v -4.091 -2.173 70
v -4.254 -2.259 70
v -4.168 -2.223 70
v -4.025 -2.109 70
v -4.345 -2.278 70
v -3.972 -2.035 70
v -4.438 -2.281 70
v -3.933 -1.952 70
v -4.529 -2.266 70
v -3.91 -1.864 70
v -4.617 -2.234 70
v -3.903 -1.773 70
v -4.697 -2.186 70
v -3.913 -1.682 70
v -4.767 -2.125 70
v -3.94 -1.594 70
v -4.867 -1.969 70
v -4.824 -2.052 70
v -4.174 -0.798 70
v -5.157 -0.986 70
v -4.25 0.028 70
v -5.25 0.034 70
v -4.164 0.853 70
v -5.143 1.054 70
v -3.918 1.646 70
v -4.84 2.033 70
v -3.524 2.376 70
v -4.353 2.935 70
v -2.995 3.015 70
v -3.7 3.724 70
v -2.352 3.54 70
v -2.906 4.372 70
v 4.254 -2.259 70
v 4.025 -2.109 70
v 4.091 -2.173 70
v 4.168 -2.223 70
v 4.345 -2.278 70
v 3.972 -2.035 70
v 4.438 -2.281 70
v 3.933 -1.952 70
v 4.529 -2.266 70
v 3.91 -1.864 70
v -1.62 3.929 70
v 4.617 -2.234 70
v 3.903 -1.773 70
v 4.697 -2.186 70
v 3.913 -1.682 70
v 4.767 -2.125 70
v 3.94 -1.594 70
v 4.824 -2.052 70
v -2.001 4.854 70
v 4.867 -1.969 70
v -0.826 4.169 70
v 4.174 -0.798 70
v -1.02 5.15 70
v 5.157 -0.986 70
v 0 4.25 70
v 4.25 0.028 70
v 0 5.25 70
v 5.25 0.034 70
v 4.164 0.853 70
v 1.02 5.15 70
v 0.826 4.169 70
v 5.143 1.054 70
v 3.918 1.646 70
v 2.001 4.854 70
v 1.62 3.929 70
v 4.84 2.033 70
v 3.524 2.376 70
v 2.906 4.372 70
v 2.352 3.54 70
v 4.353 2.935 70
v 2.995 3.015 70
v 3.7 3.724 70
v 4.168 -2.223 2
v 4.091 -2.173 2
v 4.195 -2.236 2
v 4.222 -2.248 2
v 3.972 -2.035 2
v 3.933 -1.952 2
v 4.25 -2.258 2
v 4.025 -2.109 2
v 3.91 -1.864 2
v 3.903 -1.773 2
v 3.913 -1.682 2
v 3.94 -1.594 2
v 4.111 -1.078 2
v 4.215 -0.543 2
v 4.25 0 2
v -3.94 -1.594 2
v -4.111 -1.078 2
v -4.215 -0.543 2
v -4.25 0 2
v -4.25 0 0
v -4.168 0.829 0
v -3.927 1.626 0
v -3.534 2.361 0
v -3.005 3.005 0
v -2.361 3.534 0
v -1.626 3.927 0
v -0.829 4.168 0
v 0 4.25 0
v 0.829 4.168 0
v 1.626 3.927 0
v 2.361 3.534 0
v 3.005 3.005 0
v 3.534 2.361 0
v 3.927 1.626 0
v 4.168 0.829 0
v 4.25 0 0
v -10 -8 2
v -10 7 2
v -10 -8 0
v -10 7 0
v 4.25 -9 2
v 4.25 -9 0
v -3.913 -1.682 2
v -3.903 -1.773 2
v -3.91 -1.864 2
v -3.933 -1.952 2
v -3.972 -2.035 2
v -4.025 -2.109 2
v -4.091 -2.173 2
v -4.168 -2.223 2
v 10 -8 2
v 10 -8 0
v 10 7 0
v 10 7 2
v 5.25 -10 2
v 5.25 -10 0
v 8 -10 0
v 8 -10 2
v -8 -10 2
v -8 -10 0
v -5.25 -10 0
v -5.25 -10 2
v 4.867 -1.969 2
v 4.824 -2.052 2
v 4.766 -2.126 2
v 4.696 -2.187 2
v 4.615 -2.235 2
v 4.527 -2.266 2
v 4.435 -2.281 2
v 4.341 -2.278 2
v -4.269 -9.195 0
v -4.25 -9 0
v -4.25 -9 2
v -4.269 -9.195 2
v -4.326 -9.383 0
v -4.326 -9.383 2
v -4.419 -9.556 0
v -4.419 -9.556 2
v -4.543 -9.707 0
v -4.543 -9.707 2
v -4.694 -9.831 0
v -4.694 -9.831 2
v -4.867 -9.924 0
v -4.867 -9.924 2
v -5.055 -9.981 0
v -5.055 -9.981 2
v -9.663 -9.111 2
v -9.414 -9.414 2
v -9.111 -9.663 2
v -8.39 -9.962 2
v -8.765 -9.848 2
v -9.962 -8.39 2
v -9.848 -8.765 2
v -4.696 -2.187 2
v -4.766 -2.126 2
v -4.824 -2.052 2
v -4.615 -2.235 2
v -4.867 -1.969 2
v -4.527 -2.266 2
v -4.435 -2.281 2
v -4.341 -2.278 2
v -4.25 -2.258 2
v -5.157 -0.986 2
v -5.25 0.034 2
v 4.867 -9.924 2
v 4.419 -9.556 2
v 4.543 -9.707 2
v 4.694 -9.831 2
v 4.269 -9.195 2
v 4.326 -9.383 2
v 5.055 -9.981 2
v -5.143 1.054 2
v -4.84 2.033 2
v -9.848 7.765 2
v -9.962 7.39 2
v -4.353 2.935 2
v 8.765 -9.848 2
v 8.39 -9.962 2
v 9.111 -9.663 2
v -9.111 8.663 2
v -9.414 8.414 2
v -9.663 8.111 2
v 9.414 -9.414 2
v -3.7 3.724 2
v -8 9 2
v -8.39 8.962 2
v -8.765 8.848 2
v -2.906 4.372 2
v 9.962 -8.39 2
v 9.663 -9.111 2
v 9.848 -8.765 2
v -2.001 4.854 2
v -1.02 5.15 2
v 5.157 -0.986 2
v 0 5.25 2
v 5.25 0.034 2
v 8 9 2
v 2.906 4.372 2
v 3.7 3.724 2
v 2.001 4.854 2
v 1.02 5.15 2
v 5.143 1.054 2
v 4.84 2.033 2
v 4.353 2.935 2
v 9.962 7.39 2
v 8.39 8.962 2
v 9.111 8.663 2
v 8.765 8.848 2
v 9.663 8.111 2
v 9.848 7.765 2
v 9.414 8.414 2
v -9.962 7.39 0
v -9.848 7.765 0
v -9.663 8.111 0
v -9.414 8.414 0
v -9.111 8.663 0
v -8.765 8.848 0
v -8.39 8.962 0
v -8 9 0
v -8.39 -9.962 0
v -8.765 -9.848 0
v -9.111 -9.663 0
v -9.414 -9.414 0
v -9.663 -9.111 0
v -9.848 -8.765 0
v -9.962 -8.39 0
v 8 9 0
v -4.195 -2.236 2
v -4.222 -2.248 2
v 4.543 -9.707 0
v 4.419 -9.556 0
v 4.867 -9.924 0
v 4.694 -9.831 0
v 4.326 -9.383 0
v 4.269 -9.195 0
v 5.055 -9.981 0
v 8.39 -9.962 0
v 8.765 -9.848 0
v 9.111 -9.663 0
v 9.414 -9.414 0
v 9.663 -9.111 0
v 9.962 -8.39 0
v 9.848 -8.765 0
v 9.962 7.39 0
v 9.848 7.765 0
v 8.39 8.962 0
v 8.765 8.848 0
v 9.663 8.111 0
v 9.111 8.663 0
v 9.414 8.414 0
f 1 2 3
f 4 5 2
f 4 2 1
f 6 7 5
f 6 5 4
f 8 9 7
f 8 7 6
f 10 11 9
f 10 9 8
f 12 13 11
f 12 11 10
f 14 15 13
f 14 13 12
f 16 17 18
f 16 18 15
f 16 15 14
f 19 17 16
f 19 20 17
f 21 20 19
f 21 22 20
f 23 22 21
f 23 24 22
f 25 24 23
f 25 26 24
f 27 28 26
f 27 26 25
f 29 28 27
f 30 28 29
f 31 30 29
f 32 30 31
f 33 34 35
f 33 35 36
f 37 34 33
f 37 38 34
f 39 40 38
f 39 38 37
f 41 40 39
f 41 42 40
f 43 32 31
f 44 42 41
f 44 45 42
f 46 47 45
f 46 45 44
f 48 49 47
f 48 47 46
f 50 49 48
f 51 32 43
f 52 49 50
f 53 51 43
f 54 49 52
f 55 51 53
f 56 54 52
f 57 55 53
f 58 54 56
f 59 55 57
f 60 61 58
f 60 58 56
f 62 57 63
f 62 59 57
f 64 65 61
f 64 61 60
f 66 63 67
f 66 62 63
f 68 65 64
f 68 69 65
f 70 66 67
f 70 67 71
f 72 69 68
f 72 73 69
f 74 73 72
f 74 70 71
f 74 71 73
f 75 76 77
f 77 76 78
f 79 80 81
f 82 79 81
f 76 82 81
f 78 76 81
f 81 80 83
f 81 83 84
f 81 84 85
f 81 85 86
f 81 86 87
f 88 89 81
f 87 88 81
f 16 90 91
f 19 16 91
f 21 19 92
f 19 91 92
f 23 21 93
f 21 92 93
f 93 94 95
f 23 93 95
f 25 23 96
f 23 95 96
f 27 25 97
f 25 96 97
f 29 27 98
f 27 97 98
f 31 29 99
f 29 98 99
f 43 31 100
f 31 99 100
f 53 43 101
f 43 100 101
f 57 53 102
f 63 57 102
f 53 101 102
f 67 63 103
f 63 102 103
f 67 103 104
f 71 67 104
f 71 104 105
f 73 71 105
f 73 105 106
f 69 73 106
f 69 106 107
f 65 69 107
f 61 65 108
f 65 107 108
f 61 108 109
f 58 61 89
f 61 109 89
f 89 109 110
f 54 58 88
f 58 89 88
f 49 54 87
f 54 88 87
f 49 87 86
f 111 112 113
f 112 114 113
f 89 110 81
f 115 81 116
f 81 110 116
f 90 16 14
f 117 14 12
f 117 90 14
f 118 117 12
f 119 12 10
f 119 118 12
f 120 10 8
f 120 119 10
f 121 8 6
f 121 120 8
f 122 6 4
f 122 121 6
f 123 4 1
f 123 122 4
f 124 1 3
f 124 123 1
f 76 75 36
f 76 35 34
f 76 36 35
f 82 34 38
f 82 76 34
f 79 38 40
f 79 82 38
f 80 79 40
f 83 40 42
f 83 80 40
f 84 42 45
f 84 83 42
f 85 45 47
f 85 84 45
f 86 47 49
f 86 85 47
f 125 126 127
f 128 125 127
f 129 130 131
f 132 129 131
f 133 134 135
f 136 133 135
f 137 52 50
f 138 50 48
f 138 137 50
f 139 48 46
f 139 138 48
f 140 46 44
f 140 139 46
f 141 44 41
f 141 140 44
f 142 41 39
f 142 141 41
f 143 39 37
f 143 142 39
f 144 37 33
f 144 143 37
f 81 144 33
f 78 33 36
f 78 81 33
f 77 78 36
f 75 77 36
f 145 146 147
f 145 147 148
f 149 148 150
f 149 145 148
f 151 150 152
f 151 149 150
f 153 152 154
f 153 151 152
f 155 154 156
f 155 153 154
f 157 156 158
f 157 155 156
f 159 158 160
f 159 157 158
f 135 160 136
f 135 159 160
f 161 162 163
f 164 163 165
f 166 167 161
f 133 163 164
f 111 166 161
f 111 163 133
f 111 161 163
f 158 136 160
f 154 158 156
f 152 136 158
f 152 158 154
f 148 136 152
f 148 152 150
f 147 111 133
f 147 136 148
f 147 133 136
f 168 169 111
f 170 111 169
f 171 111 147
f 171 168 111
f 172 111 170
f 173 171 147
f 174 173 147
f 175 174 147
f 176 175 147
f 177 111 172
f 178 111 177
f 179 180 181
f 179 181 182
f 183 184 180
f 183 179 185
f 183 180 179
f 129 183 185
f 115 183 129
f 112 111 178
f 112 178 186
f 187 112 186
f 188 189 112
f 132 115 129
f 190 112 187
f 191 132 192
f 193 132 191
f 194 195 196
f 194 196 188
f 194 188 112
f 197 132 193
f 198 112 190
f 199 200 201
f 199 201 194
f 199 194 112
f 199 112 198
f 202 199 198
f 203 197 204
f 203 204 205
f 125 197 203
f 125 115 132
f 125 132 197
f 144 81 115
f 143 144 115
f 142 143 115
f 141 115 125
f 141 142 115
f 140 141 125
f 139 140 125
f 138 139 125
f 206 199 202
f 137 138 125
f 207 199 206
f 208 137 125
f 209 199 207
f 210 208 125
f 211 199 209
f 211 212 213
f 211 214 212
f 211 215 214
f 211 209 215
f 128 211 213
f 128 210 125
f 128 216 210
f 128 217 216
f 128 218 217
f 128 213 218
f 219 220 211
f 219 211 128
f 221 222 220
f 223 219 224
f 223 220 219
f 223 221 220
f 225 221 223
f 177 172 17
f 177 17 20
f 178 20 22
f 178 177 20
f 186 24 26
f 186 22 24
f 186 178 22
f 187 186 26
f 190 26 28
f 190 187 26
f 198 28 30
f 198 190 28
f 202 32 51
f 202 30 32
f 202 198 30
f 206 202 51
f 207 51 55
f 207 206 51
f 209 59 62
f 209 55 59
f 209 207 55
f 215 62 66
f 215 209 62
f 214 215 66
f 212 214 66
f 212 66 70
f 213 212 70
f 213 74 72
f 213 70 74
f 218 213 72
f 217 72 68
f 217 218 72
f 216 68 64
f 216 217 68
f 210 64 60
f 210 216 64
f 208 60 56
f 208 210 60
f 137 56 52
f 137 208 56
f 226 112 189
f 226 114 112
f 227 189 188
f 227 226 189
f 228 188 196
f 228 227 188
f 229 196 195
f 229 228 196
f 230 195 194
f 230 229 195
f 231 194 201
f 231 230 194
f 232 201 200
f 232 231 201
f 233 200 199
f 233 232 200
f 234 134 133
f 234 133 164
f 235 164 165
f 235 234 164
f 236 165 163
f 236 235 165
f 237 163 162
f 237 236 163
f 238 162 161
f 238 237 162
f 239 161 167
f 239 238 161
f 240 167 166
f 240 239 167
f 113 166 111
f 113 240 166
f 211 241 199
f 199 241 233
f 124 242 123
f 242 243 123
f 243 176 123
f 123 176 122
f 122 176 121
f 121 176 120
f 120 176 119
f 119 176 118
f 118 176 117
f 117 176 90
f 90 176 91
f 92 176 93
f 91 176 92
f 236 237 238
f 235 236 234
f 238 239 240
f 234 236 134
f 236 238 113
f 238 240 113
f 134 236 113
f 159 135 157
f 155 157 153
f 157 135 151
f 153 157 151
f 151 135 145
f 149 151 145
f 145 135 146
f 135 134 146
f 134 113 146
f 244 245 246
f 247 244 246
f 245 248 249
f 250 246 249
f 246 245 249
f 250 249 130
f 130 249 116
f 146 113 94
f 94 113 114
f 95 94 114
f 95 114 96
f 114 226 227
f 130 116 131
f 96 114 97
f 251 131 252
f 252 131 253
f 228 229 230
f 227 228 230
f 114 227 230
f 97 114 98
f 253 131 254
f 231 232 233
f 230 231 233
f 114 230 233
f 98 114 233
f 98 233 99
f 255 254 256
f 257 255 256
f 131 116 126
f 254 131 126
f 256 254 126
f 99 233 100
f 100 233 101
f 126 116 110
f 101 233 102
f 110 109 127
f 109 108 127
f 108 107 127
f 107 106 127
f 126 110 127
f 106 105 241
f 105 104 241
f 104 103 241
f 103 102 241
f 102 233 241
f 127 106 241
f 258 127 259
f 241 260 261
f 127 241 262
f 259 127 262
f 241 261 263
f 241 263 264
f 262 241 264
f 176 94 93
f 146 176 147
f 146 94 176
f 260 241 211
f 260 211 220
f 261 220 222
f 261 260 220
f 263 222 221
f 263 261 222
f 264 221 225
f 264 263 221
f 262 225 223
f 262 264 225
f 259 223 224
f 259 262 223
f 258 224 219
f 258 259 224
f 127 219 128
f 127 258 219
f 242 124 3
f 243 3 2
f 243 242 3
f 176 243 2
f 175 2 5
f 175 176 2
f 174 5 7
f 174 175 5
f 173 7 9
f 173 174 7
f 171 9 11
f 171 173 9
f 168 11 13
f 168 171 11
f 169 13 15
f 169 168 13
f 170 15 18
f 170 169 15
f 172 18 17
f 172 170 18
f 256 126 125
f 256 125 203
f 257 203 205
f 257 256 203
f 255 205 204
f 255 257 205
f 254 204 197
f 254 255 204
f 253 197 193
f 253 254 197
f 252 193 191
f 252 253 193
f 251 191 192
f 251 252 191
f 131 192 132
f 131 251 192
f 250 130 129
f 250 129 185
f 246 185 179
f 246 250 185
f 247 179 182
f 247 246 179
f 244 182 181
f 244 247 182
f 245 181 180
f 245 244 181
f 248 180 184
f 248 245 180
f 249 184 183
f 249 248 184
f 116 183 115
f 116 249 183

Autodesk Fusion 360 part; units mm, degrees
sketch "Skizze1" plane through (0, 0, 0) normal (0, 0, 1) x (1, 0, 0)
  line L0 (8, 9) -> (-8, 9)
  line L1 (-10, 7) -> (-10, -8)
  line L2 (10, -8) -> (10, 7)
  line L3 (-4.25, 0) -> (-4.25, -9)
  line L4 (4.25, 0) -> (4.25, -9)
  line L5 (-4.1679, -2.2229) -> (-4.1679, -2.2229)
  line L6 (4.1679, -2.2229) -> (4.1679, -2.2229)
  arc A0 (3.9397, -1.5942) -> (-3.9397, -1.5942) centre (0, 0) ccw
  arc A1 (4.8667, -1.9692) -> (-4.8667, -1.9692) centre (0, 0) ccw
  line L7 (-8, -10) -> (-5.25, -10)
  line L8 (5.25, -10) -> (8, -10)
  arc A2 (-8, 9) -> (-10, 7) centre (-8, 7) ccw
  arc A3 (10, 7) -> (8, 9) centre (8, 7) ccw
  arc A4 (-10, -8) -> (-8, -10) centre (-8, -8) ccw
  arc A5 (8, -10) -> (10, -8) centre (8, -8) ccw
  arc A6 (-5.25, -10) -> (-4.25, -9) centre (-5.25, -9) ccw
  arc A7 (4.25, -9) -> (5.25, -10) centre (5.25, -9) ccw
  arc A8 (-4.1679, -2.2229) -> (-3.9397, -1.5942) centre (-4.4032, -1.7817) ccw
  arc A9 (-4.8667, -1.9692) -> (-4.1679, -2.2229) centre (-4.4032, -1.7817) ccw
  arc A10 (3.9397, -1.5942) -> (4.1679, -2.2229) centre (4.4032, -1.7817) ccw
  arc A11 (4.1679, -2.2229) -> (4.8667, -1.9692) centre (4.4032, -1.7817) ccw
  dimension "d7" = 2
  dimension "d8" = 2
  dimension "d9" = 2
  dimension "d10" = 2
  dimension "d11" = 1
  dimension "d12" = 1
  dimension "d13" = 0.5
  dimension "d14" = 0.5
  dimension "d15" = 0.5
  dimension "d16" = 0.5
extrude "Extrusion4" add sketch "Skizze1" along normal blind 2 contours L0 L1 L2 L3 L4 A1 L7 L8 A2 A3 A4 A5 A6 A7 A9 A11 | L3 L4 A0 A1 A9 A11
extrude "Extrusion5" add sketch "Skizze1" along normal blind 70 and the other way blind -2 contours L4 A0 A10 A11 | L3 L4 A0 A1 A9 A11 | L3 A0 A8 A9
equation "d22 = 0.00 °"
